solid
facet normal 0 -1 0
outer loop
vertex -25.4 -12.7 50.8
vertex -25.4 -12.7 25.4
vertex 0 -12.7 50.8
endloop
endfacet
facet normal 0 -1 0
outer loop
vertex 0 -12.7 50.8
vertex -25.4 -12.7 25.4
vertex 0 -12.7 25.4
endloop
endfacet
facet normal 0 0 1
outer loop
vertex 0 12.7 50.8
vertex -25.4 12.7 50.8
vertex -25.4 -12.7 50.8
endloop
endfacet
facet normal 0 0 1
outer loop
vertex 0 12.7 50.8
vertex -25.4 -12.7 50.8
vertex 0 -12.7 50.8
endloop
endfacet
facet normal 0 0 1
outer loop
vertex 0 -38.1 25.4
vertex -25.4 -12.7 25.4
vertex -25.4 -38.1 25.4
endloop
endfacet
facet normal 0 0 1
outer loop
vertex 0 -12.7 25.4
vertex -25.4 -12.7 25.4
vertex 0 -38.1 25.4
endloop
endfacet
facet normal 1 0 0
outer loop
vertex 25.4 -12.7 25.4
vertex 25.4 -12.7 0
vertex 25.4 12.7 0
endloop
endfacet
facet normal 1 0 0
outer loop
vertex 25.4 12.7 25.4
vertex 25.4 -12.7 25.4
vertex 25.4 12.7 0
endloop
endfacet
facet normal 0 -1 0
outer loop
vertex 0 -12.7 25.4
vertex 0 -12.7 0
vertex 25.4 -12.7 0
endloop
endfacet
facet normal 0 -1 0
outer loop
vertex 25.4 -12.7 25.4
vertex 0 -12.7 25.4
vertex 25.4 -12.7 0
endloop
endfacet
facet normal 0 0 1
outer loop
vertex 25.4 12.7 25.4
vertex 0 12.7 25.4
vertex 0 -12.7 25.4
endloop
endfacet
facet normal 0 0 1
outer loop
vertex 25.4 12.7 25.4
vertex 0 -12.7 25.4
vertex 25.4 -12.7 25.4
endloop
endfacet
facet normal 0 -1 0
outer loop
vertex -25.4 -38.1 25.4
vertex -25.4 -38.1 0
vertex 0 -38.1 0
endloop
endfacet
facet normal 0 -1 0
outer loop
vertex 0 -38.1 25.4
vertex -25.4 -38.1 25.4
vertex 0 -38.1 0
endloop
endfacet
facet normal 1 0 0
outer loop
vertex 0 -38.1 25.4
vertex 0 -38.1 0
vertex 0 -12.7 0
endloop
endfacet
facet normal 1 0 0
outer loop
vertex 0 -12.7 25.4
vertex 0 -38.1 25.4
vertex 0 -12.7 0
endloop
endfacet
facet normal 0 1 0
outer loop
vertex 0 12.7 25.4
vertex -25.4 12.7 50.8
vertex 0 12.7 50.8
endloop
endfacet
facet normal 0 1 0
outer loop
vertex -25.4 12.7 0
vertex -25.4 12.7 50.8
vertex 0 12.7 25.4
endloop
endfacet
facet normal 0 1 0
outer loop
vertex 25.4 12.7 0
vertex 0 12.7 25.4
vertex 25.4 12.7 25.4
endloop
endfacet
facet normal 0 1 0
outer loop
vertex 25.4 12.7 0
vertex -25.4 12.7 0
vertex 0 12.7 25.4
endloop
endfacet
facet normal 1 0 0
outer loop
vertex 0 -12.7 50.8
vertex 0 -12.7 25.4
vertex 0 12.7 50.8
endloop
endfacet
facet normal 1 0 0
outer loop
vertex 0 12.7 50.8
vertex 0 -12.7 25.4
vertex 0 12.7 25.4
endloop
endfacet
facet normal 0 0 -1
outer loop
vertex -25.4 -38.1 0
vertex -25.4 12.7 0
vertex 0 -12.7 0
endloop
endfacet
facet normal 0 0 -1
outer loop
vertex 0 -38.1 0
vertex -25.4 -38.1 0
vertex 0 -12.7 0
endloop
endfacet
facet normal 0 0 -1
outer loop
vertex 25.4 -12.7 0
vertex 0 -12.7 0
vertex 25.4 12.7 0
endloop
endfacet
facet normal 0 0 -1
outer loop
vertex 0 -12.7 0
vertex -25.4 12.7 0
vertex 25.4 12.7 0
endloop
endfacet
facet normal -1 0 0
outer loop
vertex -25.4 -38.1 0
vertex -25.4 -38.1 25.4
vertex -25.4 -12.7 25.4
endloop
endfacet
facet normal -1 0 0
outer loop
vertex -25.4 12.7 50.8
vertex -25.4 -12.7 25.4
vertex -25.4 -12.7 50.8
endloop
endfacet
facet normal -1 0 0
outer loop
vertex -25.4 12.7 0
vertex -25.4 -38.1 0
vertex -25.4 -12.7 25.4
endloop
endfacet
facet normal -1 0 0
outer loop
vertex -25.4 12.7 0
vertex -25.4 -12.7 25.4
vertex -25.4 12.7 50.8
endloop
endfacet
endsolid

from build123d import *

# Parameters (mm, degrees)
F1_DEPTH = 25.4
F2_W     = 25.4
F2_H     = 25.4
F3_DEPTH = 25.4


with BuildPart() as f1:
    # F0 (on Top) → F1 (new body)
    with BuildSketch(Plane.XY):
        Polygon((0, -12.7), (25.4, -12.7), (25.4, 12.7), (-25.4, 12.7), (-25.4, -12.7), (-25.4, -38.1), (0, -38.1), align=None)
    extrude(amount=F1_DEPTH)

    # F2 (on face) → F3 (join)
    with BuildSketch(Plane.XY.offset(25.4)):
        with Locations((-12.7, 0)):
            Rectangle(F2_W, F2_H)
    extrude(amount=F3_DEPTH)


solid = f1.part
